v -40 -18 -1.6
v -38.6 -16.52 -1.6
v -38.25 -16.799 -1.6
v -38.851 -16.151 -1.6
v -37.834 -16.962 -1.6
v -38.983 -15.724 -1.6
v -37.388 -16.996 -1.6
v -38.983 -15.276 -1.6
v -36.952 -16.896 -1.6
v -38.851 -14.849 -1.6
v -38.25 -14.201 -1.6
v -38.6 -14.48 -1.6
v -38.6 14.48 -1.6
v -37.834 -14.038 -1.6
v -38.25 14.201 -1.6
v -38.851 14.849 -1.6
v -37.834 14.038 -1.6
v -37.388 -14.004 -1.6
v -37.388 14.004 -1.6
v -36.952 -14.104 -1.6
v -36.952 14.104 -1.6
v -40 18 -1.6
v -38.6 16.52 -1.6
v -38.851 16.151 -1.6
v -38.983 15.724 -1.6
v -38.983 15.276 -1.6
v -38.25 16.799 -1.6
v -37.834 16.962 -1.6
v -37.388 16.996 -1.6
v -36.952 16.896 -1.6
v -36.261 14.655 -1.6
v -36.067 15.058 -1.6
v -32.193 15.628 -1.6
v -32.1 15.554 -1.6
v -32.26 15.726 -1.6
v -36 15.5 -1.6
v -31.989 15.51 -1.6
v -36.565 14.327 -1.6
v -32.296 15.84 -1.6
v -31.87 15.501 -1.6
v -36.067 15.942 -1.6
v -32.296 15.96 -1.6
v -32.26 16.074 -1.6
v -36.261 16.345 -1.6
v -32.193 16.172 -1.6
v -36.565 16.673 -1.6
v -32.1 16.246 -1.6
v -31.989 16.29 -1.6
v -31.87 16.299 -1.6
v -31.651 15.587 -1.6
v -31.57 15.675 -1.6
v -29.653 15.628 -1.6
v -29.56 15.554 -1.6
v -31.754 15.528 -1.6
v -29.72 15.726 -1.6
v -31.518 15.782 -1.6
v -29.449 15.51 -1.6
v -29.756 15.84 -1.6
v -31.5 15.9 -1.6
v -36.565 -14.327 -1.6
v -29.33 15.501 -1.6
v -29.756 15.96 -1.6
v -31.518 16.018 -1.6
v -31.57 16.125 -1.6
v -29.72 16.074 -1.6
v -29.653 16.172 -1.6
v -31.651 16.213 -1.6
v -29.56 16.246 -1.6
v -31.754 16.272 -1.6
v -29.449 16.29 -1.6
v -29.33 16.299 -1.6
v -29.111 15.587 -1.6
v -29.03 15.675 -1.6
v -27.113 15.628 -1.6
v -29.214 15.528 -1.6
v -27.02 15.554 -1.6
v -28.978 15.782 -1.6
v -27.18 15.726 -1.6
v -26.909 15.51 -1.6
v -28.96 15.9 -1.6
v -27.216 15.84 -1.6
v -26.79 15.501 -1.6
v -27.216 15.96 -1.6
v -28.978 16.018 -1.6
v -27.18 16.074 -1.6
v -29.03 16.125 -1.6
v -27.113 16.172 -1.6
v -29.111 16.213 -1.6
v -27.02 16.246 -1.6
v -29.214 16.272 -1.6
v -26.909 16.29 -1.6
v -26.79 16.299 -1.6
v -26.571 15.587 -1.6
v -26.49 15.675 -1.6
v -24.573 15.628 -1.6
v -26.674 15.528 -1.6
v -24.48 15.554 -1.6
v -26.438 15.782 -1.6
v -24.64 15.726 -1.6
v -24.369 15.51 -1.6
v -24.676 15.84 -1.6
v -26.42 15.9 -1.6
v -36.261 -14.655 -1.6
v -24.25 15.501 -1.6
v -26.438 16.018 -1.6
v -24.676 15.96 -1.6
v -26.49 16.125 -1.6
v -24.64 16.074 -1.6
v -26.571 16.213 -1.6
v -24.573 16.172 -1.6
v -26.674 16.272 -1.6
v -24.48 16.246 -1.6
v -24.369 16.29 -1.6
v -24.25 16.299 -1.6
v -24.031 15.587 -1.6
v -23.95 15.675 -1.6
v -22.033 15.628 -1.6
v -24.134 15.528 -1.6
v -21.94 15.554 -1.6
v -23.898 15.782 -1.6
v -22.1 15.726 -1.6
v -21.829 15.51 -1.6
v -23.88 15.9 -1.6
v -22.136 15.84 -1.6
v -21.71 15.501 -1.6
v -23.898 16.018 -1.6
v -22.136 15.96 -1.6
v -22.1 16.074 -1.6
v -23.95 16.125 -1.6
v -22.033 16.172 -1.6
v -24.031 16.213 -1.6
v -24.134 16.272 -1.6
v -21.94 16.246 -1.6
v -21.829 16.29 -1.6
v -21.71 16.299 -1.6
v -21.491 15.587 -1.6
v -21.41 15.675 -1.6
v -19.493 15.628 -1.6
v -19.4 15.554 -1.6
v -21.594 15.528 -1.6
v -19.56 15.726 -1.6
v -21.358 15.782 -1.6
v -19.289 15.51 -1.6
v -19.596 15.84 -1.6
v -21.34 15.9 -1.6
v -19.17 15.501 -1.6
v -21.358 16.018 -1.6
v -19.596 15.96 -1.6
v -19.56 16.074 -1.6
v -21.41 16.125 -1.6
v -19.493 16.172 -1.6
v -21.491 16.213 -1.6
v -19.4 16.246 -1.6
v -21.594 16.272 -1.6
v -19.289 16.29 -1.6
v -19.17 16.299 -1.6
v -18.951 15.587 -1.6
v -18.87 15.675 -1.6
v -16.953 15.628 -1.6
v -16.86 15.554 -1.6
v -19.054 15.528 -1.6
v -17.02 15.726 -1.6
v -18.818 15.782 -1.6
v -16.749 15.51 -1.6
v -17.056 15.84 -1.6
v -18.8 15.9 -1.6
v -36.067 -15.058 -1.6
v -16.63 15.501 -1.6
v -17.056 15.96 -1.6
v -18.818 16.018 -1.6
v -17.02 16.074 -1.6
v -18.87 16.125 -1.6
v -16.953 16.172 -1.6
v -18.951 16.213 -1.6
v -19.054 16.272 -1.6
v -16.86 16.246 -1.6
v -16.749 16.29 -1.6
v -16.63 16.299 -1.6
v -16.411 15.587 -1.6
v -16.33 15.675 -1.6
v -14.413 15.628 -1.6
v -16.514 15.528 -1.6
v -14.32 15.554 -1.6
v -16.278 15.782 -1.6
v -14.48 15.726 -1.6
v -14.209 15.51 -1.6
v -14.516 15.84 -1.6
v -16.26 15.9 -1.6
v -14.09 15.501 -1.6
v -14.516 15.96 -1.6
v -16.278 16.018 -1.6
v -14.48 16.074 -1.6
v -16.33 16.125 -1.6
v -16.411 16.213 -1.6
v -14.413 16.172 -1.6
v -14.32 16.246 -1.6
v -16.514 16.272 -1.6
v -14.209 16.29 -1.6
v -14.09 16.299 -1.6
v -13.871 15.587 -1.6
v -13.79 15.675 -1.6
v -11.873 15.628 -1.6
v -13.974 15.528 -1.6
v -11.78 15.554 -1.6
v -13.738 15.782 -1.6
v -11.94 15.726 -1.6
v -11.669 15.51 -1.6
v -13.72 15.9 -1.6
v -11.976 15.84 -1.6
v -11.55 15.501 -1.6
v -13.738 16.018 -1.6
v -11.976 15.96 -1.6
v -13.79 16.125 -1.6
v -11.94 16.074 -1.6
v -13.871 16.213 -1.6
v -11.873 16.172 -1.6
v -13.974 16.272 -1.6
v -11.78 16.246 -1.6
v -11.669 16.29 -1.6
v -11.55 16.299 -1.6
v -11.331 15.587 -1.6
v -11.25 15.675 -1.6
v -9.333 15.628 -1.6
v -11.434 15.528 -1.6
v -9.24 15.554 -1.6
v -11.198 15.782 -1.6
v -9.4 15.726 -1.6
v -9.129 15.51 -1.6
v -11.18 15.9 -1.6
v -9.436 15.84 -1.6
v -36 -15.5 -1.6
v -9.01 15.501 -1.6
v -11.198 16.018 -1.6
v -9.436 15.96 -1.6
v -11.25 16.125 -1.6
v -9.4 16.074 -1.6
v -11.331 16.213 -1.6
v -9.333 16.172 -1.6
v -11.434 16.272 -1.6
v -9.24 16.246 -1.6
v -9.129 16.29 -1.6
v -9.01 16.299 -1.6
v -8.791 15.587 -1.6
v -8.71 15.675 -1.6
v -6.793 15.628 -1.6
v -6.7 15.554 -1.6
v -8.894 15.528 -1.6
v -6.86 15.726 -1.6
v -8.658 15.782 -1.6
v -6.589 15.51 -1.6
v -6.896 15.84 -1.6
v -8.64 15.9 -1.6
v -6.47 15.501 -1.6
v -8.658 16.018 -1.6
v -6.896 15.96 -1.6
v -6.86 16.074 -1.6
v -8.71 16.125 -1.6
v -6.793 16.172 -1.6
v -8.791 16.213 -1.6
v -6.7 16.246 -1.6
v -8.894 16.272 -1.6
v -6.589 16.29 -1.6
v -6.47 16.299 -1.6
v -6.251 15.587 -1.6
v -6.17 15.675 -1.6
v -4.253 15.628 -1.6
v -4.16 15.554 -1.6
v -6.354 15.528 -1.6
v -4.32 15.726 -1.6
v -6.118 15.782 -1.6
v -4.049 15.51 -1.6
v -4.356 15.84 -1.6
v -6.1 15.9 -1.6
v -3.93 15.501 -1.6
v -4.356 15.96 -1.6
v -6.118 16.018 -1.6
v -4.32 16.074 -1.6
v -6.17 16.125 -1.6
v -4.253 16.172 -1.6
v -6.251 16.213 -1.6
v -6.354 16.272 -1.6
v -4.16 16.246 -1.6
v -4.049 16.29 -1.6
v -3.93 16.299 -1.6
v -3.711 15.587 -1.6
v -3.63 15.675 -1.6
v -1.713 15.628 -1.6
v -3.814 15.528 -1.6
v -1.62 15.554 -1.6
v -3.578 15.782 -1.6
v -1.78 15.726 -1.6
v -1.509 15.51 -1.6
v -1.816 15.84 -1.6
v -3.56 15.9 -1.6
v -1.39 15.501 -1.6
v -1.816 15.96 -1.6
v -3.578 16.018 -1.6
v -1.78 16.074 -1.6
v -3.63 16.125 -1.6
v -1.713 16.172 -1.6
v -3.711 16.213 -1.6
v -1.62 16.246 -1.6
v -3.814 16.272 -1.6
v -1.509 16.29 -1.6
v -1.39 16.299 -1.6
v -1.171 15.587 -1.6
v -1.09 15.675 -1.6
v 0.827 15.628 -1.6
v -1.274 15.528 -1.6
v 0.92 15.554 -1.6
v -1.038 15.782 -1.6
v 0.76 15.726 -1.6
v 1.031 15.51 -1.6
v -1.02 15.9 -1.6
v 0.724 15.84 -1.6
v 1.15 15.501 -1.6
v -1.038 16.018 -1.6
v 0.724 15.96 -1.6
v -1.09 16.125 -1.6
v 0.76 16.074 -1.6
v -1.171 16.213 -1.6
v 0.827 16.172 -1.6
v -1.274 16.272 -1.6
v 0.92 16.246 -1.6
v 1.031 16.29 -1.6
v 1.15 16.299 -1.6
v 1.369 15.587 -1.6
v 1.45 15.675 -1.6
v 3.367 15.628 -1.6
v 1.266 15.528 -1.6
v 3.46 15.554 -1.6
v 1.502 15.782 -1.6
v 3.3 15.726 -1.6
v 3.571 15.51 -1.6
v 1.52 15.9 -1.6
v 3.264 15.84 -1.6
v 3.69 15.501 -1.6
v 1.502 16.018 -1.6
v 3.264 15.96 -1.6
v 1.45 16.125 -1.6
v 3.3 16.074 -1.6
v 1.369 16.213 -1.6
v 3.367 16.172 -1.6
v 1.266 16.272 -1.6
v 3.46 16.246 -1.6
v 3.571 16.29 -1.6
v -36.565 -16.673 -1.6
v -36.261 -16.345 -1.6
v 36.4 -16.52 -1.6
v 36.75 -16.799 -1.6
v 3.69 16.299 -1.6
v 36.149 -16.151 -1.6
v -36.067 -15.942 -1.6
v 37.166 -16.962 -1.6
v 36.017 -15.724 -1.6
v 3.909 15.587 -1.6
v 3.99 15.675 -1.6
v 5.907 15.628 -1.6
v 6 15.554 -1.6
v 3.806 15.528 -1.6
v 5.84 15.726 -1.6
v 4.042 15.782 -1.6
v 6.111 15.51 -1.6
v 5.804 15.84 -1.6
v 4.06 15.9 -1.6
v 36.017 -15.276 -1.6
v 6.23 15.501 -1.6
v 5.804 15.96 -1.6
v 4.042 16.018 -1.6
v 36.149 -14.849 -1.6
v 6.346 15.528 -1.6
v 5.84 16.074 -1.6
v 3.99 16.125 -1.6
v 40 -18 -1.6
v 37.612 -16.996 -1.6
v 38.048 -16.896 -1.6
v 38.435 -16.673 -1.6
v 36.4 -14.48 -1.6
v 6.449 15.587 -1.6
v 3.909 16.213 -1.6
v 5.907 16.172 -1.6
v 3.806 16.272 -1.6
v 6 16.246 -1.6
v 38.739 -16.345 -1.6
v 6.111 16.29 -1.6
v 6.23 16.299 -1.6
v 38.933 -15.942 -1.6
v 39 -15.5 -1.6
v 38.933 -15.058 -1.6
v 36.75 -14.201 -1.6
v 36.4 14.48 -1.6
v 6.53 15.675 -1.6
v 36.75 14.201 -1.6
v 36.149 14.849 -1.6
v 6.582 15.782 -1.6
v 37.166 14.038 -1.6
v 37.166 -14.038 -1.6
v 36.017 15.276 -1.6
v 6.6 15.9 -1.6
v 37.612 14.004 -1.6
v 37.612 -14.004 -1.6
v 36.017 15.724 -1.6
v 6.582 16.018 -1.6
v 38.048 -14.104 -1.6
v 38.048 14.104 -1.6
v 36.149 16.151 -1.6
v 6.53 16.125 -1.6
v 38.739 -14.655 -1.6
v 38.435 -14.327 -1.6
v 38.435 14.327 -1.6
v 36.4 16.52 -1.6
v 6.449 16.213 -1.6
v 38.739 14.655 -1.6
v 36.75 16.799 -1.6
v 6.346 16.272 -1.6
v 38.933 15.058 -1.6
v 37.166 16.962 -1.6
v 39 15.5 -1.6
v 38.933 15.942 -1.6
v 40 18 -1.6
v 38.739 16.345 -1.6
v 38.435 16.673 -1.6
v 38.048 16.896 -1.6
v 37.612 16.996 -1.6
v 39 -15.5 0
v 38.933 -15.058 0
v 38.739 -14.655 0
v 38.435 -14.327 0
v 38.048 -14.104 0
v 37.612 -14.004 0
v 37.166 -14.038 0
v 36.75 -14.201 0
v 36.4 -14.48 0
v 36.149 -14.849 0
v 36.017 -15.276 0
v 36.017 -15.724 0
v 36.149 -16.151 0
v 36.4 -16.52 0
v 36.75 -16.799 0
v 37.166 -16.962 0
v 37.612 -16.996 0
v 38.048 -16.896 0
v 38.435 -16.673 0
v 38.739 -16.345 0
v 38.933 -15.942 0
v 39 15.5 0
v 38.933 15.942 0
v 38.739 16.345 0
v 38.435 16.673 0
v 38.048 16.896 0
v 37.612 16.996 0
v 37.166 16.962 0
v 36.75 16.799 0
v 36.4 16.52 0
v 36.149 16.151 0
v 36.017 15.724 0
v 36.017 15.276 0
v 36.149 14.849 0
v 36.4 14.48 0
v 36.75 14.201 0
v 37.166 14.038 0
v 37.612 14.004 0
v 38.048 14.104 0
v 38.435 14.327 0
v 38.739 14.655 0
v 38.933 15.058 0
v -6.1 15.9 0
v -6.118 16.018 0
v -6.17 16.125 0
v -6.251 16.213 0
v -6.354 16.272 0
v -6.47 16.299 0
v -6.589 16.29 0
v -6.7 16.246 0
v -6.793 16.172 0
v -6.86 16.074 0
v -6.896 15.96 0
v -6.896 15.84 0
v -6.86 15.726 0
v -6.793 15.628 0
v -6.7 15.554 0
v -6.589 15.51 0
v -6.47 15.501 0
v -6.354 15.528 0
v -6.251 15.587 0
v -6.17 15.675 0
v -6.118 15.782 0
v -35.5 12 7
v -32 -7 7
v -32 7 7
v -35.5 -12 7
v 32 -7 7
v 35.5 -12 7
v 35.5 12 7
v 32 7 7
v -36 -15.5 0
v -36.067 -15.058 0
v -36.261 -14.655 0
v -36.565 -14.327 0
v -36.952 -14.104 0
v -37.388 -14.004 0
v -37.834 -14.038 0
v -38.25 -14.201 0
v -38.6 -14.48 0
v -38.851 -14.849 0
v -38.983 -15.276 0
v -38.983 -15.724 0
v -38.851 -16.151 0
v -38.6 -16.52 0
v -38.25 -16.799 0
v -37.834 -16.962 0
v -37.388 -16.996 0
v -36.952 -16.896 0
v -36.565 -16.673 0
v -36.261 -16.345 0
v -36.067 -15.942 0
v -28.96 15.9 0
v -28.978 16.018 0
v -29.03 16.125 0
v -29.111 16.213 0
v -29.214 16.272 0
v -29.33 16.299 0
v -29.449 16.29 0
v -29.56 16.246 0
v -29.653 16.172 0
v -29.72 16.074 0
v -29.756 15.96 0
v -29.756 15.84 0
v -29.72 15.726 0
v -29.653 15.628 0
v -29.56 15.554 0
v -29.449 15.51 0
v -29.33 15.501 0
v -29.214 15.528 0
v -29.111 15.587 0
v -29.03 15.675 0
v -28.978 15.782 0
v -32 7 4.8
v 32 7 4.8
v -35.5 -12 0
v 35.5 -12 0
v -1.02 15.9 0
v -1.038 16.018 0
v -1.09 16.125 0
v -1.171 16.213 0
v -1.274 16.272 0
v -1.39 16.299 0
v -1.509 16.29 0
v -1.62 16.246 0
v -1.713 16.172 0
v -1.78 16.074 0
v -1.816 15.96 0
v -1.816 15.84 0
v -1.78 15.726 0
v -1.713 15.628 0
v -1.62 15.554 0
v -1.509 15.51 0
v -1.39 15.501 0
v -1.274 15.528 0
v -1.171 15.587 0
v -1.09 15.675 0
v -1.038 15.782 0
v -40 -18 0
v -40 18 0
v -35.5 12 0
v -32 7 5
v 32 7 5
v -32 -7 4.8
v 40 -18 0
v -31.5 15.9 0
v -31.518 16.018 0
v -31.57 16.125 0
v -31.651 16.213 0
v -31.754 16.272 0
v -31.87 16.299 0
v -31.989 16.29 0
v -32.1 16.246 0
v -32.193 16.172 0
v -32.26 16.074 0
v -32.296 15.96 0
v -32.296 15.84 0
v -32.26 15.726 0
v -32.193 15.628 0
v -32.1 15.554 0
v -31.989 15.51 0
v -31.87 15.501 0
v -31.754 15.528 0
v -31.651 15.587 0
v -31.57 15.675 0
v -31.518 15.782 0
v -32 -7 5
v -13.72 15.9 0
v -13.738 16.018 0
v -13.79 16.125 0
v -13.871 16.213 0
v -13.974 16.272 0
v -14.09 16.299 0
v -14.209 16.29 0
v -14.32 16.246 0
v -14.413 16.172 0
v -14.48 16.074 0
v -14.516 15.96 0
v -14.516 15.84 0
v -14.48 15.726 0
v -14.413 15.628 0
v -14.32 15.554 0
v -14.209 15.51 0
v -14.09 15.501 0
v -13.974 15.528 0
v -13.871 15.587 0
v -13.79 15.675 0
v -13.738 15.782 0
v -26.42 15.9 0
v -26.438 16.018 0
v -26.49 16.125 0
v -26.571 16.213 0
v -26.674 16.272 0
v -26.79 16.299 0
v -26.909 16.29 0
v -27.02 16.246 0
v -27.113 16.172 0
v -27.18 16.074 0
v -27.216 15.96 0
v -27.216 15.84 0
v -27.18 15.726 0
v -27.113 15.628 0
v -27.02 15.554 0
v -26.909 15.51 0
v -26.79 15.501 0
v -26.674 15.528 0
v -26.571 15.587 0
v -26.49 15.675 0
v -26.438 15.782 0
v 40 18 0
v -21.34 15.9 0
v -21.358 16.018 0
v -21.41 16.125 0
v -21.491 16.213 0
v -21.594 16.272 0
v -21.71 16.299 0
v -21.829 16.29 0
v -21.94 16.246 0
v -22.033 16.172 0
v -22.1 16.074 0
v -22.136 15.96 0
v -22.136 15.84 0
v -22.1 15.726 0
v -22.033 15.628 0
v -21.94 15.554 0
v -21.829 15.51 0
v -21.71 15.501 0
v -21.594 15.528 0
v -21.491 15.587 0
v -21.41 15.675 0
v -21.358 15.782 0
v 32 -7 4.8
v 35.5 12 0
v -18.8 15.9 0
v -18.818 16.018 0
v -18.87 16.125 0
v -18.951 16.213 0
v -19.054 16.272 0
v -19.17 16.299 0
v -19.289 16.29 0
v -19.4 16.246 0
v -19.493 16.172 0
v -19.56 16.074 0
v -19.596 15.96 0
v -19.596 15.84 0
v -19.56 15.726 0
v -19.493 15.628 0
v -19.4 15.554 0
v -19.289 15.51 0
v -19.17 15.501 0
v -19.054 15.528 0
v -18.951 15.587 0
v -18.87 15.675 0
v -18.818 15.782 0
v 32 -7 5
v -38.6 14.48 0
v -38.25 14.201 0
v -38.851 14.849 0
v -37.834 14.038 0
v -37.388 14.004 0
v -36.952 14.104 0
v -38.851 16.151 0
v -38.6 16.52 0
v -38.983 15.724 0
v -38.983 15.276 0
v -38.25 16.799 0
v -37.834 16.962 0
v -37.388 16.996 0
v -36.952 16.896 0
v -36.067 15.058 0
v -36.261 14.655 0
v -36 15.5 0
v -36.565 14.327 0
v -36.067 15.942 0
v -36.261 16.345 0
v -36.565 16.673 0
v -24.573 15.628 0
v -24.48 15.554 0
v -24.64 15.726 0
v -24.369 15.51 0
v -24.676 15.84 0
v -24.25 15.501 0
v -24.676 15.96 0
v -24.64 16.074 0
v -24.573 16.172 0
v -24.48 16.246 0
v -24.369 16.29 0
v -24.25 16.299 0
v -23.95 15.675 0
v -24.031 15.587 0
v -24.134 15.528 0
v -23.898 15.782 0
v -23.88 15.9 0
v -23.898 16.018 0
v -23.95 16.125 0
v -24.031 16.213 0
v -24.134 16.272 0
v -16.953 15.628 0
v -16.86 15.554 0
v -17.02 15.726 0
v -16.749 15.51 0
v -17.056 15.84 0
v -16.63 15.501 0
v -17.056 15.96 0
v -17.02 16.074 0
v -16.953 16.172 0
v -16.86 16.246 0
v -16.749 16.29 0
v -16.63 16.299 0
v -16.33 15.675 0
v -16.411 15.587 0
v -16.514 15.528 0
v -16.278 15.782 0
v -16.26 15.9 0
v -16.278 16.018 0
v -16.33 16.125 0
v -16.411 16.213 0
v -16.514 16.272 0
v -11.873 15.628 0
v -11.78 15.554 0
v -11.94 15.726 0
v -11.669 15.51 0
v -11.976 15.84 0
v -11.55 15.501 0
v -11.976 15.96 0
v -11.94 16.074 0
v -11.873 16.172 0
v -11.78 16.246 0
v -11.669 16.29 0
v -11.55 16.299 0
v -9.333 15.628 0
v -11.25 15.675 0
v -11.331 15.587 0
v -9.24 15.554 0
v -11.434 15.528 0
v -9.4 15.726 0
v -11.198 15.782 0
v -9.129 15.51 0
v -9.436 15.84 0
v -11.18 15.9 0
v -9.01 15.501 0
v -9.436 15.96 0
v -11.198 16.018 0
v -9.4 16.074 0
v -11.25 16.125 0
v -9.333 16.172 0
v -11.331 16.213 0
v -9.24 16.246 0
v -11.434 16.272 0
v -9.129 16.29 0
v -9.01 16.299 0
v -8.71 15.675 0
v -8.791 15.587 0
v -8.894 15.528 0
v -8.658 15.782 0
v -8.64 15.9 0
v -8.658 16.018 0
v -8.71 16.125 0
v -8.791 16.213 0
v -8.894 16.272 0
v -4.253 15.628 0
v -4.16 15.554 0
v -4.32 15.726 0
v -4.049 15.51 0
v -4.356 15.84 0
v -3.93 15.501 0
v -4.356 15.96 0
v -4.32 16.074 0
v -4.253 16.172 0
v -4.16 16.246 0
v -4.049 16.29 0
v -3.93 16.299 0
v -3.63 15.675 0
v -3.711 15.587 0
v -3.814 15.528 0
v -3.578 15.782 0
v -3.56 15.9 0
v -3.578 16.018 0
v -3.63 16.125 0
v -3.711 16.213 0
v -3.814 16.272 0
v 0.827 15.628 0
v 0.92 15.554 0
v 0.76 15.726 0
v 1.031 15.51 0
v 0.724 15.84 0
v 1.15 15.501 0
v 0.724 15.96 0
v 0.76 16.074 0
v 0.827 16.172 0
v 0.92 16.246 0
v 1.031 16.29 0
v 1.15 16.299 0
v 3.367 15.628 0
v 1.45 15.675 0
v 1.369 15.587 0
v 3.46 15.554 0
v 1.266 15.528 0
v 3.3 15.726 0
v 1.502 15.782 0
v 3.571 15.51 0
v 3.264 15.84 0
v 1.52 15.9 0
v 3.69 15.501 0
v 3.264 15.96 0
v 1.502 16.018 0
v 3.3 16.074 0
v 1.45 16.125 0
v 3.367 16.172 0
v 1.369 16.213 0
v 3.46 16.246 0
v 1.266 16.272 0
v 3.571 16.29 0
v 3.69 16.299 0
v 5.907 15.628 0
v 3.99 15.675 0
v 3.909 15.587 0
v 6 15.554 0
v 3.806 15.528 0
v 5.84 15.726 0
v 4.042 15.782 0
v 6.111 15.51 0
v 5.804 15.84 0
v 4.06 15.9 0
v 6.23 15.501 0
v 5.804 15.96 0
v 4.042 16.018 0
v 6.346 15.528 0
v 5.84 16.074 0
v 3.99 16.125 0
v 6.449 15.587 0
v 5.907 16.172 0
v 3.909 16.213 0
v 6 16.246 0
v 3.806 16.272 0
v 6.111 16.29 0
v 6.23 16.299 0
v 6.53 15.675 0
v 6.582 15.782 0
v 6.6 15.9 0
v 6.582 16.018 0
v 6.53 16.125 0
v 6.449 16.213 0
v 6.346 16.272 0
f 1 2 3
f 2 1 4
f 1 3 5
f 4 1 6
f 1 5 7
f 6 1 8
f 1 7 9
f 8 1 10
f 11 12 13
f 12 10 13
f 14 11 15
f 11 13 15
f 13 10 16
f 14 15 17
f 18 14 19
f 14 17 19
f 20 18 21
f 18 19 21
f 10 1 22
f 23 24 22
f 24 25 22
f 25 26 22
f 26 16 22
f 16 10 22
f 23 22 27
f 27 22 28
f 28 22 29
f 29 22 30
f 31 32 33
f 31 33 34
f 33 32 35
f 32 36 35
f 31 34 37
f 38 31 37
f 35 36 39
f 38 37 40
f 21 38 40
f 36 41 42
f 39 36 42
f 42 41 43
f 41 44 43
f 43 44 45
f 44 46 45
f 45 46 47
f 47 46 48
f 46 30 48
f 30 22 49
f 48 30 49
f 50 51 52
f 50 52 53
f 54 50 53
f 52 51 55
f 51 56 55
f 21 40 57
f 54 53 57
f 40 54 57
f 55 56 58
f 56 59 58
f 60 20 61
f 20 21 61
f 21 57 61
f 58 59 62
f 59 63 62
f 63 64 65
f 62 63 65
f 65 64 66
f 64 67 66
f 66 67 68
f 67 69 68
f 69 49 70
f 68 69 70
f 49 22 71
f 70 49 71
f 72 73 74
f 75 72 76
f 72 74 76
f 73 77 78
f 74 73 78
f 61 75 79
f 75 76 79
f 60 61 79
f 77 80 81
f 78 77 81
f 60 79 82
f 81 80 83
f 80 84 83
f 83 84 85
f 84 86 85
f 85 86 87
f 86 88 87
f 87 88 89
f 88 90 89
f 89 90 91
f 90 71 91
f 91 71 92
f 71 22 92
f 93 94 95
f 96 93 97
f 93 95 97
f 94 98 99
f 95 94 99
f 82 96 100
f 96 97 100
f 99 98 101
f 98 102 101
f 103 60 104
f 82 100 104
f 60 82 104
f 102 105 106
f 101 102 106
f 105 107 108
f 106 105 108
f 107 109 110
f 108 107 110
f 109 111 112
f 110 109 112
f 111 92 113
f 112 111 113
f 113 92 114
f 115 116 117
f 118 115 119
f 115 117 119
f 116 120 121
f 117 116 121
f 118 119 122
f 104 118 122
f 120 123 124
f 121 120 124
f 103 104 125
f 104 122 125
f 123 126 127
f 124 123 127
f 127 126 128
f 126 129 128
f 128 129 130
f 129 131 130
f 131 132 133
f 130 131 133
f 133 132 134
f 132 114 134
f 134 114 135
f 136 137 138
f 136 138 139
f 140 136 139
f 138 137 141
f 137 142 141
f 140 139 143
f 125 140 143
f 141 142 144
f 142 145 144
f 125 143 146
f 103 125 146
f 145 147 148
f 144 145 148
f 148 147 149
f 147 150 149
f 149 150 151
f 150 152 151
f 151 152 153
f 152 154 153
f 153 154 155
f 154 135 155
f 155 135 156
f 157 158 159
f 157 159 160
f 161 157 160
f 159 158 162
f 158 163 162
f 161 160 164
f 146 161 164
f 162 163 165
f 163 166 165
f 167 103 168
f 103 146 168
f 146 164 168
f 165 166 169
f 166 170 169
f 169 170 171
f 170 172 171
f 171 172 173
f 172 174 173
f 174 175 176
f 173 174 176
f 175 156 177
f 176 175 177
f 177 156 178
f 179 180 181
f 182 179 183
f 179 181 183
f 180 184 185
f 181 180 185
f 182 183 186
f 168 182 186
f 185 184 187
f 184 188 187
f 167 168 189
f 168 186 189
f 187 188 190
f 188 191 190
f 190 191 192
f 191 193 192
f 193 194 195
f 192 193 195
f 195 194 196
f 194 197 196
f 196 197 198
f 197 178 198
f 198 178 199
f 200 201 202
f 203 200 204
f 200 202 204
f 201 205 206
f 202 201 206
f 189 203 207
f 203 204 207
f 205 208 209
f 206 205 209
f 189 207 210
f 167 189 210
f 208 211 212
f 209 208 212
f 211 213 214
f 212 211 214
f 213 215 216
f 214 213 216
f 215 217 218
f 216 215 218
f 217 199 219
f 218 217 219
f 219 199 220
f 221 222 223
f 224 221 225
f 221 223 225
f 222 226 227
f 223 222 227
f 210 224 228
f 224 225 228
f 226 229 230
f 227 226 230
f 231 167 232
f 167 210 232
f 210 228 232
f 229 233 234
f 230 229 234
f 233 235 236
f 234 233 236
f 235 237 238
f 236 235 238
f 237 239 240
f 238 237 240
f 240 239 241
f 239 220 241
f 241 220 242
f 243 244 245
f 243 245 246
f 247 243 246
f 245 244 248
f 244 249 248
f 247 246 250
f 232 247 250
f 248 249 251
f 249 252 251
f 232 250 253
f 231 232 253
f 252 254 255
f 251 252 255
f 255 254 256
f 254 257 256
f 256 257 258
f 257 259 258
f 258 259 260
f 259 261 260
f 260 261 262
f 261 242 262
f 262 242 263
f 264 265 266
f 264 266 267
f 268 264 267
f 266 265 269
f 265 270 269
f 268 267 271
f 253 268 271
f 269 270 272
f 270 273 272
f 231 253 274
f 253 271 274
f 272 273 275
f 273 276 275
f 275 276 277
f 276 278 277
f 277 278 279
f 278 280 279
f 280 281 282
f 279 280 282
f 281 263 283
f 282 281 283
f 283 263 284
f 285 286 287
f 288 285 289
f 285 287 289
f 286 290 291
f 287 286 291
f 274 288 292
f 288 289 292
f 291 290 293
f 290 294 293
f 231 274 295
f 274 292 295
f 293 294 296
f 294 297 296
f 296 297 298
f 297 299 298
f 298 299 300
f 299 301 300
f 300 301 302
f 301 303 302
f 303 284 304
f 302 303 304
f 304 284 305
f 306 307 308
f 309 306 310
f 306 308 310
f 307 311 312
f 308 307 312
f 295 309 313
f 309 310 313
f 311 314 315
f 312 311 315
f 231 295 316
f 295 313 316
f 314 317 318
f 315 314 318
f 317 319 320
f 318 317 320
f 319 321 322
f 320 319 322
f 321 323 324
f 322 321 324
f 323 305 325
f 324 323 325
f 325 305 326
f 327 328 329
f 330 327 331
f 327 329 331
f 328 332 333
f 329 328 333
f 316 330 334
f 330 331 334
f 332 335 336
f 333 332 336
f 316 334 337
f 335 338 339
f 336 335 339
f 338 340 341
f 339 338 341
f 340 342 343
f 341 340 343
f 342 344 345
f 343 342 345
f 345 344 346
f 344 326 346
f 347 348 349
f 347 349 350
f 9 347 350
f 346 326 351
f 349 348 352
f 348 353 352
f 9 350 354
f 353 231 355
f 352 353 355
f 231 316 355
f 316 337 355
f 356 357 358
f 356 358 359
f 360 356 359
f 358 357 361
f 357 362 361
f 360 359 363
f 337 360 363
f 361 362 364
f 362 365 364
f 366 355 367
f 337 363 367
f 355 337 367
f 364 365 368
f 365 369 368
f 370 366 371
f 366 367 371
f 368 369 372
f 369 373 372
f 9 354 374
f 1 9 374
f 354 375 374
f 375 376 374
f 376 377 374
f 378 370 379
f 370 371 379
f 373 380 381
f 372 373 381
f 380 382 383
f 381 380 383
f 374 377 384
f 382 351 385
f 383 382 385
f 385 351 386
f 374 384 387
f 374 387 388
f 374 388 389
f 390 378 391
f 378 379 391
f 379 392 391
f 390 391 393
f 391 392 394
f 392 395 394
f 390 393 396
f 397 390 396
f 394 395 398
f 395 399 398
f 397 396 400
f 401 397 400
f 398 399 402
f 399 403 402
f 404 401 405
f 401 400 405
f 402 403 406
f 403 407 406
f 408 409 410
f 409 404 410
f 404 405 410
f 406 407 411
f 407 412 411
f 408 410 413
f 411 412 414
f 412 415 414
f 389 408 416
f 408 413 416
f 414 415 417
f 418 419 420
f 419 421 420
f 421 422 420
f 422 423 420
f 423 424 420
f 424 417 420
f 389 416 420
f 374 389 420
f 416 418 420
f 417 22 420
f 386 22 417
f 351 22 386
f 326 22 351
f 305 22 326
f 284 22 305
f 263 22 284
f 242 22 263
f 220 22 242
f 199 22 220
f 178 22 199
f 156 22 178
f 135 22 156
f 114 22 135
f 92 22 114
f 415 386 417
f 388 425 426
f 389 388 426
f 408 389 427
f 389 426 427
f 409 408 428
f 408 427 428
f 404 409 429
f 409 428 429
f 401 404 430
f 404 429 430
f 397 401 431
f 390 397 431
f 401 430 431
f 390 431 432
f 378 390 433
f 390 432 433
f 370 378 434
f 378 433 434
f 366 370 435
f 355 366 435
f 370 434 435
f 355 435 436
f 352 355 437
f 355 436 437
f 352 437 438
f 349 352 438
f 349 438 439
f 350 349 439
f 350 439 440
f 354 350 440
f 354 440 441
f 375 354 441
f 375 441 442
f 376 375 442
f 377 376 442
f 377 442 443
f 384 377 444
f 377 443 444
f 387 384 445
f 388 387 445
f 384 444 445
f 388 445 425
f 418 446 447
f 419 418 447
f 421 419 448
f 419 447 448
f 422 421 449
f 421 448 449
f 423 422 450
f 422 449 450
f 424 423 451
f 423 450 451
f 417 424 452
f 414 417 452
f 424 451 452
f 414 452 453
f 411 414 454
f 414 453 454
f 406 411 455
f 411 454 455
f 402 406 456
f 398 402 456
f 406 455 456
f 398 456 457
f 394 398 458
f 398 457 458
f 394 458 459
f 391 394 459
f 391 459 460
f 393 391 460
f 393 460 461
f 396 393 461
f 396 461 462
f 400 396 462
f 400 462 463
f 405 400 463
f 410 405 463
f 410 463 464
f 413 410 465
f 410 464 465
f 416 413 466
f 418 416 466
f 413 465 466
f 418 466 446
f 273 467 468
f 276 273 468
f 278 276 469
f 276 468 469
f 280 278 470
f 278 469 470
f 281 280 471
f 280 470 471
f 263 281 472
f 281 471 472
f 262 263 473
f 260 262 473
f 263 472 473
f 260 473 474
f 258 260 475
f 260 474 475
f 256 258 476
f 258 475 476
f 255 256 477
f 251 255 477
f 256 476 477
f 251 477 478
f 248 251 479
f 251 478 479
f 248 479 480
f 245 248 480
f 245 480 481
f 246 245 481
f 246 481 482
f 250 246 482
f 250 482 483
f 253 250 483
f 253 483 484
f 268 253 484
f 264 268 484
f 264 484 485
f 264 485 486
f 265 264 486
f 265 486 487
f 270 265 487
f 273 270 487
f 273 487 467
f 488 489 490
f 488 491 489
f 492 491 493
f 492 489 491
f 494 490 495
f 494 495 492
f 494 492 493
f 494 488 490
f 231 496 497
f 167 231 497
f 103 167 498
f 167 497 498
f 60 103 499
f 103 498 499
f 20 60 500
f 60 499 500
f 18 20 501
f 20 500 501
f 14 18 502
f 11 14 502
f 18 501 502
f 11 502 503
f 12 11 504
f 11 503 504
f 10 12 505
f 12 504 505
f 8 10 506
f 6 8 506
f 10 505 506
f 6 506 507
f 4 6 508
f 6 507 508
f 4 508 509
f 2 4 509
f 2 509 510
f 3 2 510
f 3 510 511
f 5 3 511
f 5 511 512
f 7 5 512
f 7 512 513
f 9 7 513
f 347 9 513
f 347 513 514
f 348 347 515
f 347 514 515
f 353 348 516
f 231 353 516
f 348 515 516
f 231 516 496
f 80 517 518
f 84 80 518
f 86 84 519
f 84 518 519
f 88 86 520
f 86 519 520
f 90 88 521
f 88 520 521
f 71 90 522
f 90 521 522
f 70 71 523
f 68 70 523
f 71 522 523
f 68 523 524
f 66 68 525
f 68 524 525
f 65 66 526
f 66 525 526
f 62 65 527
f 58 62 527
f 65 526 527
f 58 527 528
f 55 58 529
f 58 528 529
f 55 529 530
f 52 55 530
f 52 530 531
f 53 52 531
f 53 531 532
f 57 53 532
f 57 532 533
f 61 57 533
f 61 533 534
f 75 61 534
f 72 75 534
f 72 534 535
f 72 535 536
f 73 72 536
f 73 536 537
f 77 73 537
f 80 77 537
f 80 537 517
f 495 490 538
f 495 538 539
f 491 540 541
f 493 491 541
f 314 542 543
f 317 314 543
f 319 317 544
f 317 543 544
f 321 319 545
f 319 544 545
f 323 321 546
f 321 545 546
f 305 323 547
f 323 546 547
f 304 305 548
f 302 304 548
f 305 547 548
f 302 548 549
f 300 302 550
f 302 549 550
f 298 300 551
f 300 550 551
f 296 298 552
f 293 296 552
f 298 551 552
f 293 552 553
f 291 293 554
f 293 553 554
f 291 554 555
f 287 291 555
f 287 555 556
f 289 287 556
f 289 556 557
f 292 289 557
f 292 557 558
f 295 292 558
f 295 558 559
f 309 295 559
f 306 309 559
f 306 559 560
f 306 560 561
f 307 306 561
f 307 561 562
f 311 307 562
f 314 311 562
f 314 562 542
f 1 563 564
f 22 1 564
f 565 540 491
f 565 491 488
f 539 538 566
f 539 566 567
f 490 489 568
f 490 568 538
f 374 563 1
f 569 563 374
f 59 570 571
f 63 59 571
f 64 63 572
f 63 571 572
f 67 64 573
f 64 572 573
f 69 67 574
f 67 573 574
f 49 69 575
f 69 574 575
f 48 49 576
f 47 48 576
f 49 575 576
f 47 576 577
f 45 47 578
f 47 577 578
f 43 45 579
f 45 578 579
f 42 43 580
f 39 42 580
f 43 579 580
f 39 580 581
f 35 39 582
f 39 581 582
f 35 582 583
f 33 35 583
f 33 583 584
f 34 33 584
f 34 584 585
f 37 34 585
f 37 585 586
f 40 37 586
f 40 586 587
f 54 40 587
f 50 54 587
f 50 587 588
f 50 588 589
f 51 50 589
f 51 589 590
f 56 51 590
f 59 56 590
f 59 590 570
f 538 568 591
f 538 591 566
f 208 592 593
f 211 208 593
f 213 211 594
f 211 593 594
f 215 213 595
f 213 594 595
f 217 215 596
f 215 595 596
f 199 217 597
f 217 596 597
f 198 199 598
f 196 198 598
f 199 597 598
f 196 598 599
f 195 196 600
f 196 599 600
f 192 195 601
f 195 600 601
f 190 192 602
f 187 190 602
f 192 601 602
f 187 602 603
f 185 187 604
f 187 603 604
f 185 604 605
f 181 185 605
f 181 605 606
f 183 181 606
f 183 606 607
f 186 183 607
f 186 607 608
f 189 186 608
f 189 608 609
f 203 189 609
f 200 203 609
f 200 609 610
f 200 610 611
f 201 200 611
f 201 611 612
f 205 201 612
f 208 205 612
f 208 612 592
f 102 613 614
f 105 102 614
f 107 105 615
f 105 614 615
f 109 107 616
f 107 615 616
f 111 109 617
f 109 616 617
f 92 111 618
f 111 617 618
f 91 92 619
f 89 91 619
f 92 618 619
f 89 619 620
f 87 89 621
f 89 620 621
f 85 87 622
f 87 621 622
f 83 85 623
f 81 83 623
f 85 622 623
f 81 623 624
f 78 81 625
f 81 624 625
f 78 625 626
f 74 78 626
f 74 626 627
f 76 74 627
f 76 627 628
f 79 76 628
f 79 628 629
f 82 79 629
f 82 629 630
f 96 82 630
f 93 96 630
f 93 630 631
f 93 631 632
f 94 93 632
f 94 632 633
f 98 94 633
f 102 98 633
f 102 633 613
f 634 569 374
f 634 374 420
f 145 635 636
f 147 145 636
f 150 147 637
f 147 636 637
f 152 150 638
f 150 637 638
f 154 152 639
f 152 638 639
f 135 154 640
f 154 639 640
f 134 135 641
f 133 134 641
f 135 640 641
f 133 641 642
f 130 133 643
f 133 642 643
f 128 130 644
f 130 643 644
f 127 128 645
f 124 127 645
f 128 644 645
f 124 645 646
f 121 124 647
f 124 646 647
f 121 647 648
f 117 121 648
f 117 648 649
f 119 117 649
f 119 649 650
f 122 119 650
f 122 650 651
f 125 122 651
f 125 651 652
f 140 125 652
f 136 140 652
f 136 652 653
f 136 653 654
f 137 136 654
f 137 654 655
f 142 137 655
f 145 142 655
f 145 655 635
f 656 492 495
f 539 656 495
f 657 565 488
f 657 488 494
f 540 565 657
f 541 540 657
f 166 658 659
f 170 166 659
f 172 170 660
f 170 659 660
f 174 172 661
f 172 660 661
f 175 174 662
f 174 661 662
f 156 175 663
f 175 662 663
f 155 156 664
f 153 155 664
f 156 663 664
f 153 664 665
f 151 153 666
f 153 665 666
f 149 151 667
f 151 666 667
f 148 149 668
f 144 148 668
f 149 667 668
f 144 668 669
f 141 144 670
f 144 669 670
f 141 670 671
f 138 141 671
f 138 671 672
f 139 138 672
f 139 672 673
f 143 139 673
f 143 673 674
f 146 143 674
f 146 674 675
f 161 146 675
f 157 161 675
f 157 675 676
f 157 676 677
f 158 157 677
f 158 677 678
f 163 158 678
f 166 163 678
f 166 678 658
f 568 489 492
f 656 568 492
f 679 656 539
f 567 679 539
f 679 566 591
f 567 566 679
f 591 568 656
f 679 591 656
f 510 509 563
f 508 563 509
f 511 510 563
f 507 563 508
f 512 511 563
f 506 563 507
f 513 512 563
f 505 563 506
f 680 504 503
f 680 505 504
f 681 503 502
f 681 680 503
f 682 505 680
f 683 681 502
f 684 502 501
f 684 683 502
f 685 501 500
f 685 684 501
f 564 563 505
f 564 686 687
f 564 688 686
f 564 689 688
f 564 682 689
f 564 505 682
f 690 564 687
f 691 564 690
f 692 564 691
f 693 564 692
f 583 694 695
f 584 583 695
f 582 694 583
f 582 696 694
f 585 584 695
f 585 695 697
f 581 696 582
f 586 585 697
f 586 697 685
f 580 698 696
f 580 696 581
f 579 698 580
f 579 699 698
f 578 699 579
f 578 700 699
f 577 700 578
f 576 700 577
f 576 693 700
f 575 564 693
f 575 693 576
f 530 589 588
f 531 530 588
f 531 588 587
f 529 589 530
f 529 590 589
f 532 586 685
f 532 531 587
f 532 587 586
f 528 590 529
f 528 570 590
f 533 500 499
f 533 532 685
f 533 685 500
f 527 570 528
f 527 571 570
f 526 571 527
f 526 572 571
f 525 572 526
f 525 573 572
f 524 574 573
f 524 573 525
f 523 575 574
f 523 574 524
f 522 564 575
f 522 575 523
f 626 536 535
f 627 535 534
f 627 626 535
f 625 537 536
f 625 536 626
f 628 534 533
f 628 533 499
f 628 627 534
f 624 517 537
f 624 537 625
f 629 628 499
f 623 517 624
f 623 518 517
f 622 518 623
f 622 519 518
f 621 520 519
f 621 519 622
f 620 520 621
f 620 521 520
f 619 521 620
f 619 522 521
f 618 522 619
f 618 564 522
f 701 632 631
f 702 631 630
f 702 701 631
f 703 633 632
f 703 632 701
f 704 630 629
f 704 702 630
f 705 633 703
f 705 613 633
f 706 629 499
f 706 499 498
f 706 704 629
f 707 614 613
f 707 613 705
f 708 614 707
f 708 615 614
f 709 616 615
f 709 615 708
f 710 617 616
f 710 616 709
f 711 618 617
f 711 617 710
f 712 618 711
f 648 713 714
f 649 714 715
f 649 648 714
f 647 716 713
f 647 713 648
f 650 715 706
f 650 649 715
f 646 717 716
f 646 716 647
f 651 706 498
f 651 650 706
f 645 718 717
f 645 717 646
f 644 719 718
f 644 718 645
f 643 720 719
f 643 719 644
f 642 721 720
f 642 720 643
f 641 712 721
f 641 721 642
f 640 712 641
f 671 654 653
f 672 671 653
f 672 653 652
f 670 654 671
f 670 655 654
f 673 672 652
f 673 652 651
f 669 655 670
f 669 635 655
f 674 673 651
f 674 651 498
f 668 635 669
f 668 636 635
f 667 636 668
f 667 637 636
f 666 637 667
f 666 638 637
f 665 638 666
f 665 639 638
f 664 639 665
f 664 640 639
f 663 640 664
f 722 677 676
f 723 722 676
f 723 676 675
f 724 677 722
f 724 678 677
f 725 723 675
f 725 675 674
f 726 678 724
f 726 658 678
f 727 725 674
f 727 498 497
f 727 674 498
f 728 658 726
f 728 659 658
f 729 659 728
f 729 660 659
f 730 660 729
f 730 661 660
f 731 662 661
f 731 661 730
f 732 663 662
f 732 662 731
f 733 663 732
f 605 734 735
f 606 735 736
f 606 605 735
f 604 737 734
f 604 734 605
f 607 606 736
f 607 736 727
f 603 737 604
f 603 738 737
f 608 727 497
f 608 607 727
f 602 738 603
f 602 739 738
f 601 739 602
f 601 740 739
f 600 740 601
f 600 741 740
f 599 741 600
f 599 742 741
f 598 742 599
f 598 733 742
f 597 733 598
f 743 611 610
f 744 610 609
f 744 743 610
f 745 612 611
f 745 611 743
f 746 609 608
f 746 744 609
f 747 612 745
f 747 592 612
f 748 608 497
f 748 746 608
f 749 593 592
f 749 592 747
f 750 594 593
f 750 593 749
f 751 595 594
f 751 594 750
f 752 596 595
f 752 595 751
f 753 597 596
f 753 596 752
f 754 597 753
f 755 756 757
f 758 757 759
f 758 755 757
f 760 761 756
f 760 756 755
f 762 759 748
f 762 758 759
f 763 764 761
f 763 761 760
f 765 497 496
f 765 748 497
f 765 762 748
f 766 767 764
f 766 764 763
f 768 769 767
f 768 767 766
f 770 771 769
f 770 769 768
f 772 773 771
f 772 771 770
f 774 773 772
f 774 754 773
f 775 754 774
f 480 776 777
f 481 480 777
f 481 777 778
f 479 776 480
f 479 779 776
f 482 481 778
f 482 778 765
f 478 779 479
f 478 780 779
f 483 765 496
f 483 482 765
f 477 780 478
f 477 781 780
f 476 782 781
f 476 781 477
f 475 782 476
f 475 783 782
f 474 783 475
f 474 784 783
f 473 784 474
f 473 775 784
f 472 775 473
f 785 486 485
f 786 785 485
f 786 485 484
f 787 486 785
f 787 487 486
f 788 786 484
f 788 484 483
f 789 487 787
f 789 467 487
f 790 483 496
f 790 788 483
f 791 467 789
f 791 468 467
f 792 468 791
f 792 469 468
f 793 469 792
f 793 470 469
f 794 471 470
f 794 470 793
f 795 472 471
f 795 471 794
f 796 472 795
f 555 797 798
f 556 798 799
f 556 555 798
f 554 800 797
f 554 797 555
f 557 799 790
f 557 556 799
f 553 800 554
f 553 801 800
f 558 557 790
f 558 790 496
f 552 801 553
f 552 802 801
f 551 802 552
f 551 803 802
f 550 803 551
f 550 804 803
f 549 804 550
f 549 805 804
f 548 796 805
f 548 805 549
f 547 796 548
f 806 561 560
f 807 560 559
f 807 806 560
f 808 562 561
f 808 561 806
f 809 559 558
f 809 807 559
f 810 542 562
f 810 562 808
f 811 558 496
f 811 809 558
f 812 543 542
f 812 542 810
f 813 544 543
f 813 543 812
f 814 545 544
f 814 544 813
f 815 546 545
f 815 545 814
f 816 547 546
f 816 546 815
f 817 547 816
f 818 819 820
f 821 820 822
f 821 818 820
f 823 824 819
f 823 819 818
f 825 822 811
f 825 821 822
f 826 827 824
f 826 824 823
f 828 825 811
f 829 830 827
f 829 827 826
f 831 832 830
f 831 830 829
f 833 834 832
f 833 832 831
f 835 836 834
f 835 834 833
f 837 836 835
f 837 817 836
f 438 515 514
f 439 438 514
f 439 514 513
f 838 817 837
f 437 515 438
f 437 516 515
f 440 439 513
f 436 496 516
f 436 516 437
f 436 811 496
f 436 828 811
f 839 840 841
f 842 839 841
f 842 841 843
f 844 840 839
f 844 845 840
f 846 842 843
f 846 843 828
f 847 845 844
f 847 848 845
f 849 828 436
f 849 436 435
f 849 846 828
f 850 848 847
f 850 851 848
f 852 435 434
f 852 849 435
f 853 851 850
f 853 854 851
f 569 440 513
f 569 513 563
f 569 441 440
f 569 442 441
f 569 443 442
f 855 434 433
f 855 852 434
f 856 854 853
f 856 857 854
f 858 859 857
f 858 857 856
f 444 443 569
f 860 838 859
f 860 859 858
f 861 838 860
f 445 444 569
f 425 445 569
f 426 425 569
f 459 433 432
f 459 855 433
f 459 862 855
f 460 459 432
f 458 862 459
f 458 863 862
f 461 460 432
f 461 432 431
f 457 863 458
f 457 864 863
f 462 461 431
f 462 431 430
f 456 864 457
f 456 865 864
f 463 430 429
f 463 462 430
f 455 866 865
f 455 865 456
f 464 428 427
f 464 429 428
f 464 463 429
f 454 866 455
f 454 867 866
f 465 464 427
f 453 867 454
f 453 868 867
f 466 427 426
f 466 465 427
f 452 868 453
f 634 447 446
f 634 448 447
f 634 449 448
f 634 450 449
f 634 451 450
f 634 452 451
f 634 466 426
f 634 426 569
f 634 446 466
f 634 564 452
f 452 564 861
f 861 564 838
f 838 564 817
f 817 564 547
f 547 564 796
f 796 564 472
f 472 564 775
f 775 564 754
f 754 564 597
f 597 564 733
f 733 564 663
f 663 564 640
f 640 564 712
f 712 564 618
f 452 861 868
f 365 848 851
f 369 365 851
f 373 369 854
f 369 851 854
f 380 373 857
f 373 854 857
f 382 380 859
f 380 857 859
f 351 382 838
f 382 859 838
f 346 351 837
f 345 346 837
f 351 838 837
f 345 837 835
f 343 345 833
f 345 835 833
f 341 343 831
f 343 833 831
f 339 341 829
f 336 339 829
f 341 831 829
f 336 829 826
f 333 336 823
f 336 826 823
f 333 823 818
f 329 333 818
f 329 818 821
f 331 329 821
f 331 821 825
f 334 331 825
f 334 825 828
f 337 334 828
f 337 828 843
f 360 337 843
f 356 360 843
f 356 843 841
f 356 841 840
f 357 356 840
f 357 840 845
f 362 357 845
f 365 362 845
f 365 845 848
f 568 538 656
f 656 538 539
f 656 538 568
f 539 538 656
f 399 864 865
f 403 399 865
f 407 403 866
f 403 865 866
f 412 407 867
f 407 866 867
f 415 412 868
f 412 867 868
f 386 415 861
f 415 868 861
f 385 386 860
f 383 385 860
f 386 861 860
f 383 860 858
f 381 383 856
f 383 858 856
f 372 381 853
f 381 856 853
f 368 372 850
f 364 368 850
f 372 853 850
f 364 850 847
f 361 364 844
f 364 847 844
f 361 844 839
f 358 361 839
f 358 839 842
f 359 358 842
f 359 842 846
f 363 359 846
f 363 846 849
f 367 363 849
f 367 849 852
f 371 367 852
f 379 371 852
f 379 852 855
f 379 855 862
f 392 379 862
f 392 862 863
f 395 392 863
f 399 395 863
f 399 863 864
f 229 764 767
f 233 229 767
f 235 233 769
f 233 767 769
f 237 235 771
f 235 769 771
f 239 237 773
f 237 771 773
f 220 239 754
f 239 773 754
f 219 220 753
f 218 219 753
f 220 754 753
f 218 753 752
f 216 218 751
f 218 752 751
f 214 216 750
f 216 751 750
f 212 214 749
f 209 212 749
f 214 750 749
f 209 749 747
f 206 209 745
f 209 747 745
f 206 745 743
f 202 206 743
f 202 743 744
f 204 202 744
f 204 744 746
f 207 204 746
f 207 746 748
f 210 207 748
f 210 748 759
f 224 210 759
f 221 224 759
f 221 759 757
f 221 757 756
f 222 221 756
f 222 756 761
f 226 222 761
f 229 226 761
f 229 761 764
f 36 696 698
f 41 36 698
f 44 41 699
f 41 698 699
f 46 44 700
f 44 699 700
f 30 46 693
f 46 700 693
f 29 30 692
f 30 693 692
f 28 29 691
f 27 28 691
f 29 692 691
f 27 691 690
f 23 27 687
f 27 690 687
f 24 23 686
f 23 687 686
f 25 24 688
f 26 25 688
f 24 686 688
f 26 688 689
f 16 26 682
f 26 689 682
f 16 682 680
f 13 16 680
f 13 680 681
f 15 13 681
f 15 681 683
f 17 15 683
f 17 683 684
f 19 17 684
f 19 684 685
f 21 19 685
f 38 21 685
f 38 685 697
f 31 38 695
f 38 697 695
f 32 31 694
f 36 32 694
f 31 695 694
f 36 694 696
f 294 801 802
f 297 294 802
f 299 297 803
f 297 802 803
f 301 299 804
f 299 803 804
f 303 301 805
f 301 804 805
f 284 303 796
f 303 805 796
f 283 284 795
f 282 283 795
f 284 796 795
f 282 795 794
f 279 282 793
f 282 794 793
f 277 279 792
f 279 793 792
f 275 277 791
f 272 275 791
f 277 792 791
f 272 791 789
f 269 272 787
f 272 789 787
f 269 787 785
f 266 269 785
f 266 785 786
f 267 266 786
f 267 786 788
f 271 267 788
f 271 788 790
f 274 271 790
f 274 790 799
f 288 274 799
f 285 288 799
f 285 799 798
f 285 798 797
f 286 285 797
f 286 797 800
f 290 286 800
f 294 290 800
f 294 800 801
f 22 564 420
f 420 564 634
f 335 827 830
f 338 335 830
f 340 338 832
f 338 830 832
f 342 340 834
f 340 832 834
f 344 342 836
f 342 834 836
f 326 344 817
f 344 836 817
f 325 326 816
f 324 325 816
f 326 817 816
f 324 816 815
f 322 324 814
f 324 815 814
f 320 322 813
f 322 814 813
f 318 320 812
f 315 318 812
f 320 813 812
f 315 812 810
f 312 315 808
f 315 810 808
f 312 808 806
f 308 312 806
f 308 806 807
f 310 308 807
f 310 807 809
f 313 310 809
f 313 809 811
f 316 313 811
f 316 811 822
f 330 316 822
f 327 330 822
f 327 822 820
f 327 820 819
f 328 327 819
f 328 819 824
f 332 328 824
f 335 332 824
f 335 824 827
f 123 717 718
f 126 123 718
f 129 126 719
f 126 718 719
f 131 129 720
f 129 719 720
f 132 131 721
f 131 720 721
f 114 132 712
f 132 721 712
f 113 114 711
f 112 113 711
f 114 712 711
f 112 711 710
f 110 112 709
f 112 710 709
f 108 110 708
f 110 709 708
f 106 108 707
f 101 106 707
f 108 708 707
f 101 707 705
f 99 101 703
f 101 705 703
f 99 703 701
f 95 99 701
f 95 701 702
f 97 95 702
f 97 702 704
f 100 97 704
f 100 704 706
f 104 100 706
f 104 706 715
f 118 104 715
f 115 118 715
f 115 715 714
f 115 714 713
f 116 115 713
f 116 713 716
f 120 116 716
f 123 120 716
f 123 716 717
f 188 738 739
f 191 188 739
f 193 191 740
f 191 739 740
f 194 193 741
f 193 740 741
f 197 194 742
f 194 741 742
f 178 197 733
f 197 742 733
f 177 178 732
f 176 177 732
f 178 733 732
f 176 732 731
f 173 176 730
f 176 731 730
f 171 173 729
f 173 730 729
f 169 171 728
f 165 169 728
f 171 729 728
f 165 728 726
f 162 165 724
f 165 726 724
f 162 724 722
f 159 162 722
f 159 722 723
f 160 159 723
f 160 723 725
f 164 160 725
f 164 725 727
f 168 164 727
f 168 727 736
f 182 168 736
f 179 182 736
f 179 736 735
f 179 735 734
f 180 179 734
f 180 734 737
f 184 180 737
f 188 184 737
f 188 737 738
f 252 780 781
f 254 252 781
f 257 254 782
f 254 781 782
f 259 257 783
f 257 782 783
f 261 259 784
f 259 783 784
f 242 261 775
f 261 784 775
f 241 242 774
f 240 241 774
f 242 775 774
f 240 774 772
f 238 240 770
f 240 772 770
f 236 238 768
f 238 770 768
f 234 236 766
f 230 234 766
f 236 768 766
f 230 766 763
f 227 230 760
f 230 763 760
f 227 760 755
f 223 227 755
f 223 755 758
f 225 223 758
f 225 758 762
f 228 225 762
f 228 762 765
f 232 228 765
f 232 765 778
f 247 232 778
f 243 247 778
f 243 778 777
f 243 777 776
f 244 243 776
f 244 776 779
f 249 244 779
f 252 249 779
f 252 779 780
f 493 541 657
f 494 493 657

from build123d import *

# Parameters (mm, degrees)
F0_W      = 80
F0_H      = 36
F0_R      = 1.5
F0_W_2    = 71
F0_H_2    = 24
F1_DEPTH  = 1.6
F2_DEPTH  = 7
F3_W      = 64
F3_H      = 14
F4_DEPTH  = 2.2
F4_FACE_W = 64
F4_FACE_H = 14
F5_DEPTH  = 0.2
F6_R      = 0.4
F7_DEPTH  = 25


with BuildPart() as f1:
    # F0 (on Top) → F1 (new body)
    with BuildSketch(Plane.XY):
        Rectangle(F0_W, F0_H)
        with Locations((-37.5, -15.5)):
            Circle(F0_R, mode=Mode.SUBTRACT)
        with Locations((37.5, -15.5)):
            Circle(F0_R, mode=Mode.SUBTRACT)
        with Locations((-37.5, 15.5)):
            Circle(F0_R, mode=Mode.SUBTRACT)
        Rectangle(F0_W_2, F0_H_2, mode=Mode.SUBTRACT)
        with Locations((37.5, 15.5)):
            Circle(F0_R, mode=Mode.SUBTRACT)
        Rectangle(F0_W_2, F0_H_2)
    extrude(amount=-F1_DEPTH)

    # F6 (on face) → F7 (cut)
    with BuildSketch(Plane.XY):
        with Locations((-31.9, 15.9)):
            Circle(F6_R)
        with Locations((-29.36, 15.9)):
            Circle(F6_R)
        with Locations((-26.82, 15.9)):
            Circle(F6_R)
        with Locations((-24.28, 15.9)):
            Circle(F6_R)
        with Locations((-21.74, 15.9)):
            Circle(F6_R)
        with Locations((-19.2, 15.9)):
            Circle(F6_R)
        with Locations((-16.66, 15.9)):
            Circle(F6_R)
        with Locations((-14.12, 15.9)):
            Circle(F6_R)
        with Locations((-11.58, 15.9)):
            Circle(F6_R)
        with Locations((-9.04, 15.9)):
            Circle(F6_R)
        with Locations((-6.5, 15.9)):
            Circle(F6_R)
        with Locations((-3.96, 15.9)):
            Circle(F6_R)
        with Locations((-1.42, 15.9)):
            Circle(F6_R)
        with Locations((1.12, 15.9)):
            Circle(F6_R)
        with Locations((3.66, 15.9)):
            Circle(F6_R)
        with Locations((6.2, 15.9)):
            Circle(F6_R)
    extrude(amount=-F7_DEPTH, mode=Mode.SUBTRACT)


with BuildPart() as f2:
    # F0 (on Top) → F2 (new body)
    with BuildSketch(Plane.XY):
        Rectangle(F0_W_2, F0_H_2)
    extrude(amount=F2_DEPTH)

    # F3 (on face) → F4 (cut)
    with BuildSketch(Plane.XY.offset(7)):
        Rectangle(F3_W, F3_H)
    extrude(amount=-F4_DEPTH, mode=Mode.SUBTRACT)


with BuildPart() as f5:
    # F4_face (on face) → F5 (new body)
    with BuildSketch(Plane.XY.offset(4.8)):
        Rectangle(F4_FACE_W, F4_FACE_H)
    extrude(amount=F5_DEPTH)


solid = Compound([f1.part, f2.part, f5.part])
